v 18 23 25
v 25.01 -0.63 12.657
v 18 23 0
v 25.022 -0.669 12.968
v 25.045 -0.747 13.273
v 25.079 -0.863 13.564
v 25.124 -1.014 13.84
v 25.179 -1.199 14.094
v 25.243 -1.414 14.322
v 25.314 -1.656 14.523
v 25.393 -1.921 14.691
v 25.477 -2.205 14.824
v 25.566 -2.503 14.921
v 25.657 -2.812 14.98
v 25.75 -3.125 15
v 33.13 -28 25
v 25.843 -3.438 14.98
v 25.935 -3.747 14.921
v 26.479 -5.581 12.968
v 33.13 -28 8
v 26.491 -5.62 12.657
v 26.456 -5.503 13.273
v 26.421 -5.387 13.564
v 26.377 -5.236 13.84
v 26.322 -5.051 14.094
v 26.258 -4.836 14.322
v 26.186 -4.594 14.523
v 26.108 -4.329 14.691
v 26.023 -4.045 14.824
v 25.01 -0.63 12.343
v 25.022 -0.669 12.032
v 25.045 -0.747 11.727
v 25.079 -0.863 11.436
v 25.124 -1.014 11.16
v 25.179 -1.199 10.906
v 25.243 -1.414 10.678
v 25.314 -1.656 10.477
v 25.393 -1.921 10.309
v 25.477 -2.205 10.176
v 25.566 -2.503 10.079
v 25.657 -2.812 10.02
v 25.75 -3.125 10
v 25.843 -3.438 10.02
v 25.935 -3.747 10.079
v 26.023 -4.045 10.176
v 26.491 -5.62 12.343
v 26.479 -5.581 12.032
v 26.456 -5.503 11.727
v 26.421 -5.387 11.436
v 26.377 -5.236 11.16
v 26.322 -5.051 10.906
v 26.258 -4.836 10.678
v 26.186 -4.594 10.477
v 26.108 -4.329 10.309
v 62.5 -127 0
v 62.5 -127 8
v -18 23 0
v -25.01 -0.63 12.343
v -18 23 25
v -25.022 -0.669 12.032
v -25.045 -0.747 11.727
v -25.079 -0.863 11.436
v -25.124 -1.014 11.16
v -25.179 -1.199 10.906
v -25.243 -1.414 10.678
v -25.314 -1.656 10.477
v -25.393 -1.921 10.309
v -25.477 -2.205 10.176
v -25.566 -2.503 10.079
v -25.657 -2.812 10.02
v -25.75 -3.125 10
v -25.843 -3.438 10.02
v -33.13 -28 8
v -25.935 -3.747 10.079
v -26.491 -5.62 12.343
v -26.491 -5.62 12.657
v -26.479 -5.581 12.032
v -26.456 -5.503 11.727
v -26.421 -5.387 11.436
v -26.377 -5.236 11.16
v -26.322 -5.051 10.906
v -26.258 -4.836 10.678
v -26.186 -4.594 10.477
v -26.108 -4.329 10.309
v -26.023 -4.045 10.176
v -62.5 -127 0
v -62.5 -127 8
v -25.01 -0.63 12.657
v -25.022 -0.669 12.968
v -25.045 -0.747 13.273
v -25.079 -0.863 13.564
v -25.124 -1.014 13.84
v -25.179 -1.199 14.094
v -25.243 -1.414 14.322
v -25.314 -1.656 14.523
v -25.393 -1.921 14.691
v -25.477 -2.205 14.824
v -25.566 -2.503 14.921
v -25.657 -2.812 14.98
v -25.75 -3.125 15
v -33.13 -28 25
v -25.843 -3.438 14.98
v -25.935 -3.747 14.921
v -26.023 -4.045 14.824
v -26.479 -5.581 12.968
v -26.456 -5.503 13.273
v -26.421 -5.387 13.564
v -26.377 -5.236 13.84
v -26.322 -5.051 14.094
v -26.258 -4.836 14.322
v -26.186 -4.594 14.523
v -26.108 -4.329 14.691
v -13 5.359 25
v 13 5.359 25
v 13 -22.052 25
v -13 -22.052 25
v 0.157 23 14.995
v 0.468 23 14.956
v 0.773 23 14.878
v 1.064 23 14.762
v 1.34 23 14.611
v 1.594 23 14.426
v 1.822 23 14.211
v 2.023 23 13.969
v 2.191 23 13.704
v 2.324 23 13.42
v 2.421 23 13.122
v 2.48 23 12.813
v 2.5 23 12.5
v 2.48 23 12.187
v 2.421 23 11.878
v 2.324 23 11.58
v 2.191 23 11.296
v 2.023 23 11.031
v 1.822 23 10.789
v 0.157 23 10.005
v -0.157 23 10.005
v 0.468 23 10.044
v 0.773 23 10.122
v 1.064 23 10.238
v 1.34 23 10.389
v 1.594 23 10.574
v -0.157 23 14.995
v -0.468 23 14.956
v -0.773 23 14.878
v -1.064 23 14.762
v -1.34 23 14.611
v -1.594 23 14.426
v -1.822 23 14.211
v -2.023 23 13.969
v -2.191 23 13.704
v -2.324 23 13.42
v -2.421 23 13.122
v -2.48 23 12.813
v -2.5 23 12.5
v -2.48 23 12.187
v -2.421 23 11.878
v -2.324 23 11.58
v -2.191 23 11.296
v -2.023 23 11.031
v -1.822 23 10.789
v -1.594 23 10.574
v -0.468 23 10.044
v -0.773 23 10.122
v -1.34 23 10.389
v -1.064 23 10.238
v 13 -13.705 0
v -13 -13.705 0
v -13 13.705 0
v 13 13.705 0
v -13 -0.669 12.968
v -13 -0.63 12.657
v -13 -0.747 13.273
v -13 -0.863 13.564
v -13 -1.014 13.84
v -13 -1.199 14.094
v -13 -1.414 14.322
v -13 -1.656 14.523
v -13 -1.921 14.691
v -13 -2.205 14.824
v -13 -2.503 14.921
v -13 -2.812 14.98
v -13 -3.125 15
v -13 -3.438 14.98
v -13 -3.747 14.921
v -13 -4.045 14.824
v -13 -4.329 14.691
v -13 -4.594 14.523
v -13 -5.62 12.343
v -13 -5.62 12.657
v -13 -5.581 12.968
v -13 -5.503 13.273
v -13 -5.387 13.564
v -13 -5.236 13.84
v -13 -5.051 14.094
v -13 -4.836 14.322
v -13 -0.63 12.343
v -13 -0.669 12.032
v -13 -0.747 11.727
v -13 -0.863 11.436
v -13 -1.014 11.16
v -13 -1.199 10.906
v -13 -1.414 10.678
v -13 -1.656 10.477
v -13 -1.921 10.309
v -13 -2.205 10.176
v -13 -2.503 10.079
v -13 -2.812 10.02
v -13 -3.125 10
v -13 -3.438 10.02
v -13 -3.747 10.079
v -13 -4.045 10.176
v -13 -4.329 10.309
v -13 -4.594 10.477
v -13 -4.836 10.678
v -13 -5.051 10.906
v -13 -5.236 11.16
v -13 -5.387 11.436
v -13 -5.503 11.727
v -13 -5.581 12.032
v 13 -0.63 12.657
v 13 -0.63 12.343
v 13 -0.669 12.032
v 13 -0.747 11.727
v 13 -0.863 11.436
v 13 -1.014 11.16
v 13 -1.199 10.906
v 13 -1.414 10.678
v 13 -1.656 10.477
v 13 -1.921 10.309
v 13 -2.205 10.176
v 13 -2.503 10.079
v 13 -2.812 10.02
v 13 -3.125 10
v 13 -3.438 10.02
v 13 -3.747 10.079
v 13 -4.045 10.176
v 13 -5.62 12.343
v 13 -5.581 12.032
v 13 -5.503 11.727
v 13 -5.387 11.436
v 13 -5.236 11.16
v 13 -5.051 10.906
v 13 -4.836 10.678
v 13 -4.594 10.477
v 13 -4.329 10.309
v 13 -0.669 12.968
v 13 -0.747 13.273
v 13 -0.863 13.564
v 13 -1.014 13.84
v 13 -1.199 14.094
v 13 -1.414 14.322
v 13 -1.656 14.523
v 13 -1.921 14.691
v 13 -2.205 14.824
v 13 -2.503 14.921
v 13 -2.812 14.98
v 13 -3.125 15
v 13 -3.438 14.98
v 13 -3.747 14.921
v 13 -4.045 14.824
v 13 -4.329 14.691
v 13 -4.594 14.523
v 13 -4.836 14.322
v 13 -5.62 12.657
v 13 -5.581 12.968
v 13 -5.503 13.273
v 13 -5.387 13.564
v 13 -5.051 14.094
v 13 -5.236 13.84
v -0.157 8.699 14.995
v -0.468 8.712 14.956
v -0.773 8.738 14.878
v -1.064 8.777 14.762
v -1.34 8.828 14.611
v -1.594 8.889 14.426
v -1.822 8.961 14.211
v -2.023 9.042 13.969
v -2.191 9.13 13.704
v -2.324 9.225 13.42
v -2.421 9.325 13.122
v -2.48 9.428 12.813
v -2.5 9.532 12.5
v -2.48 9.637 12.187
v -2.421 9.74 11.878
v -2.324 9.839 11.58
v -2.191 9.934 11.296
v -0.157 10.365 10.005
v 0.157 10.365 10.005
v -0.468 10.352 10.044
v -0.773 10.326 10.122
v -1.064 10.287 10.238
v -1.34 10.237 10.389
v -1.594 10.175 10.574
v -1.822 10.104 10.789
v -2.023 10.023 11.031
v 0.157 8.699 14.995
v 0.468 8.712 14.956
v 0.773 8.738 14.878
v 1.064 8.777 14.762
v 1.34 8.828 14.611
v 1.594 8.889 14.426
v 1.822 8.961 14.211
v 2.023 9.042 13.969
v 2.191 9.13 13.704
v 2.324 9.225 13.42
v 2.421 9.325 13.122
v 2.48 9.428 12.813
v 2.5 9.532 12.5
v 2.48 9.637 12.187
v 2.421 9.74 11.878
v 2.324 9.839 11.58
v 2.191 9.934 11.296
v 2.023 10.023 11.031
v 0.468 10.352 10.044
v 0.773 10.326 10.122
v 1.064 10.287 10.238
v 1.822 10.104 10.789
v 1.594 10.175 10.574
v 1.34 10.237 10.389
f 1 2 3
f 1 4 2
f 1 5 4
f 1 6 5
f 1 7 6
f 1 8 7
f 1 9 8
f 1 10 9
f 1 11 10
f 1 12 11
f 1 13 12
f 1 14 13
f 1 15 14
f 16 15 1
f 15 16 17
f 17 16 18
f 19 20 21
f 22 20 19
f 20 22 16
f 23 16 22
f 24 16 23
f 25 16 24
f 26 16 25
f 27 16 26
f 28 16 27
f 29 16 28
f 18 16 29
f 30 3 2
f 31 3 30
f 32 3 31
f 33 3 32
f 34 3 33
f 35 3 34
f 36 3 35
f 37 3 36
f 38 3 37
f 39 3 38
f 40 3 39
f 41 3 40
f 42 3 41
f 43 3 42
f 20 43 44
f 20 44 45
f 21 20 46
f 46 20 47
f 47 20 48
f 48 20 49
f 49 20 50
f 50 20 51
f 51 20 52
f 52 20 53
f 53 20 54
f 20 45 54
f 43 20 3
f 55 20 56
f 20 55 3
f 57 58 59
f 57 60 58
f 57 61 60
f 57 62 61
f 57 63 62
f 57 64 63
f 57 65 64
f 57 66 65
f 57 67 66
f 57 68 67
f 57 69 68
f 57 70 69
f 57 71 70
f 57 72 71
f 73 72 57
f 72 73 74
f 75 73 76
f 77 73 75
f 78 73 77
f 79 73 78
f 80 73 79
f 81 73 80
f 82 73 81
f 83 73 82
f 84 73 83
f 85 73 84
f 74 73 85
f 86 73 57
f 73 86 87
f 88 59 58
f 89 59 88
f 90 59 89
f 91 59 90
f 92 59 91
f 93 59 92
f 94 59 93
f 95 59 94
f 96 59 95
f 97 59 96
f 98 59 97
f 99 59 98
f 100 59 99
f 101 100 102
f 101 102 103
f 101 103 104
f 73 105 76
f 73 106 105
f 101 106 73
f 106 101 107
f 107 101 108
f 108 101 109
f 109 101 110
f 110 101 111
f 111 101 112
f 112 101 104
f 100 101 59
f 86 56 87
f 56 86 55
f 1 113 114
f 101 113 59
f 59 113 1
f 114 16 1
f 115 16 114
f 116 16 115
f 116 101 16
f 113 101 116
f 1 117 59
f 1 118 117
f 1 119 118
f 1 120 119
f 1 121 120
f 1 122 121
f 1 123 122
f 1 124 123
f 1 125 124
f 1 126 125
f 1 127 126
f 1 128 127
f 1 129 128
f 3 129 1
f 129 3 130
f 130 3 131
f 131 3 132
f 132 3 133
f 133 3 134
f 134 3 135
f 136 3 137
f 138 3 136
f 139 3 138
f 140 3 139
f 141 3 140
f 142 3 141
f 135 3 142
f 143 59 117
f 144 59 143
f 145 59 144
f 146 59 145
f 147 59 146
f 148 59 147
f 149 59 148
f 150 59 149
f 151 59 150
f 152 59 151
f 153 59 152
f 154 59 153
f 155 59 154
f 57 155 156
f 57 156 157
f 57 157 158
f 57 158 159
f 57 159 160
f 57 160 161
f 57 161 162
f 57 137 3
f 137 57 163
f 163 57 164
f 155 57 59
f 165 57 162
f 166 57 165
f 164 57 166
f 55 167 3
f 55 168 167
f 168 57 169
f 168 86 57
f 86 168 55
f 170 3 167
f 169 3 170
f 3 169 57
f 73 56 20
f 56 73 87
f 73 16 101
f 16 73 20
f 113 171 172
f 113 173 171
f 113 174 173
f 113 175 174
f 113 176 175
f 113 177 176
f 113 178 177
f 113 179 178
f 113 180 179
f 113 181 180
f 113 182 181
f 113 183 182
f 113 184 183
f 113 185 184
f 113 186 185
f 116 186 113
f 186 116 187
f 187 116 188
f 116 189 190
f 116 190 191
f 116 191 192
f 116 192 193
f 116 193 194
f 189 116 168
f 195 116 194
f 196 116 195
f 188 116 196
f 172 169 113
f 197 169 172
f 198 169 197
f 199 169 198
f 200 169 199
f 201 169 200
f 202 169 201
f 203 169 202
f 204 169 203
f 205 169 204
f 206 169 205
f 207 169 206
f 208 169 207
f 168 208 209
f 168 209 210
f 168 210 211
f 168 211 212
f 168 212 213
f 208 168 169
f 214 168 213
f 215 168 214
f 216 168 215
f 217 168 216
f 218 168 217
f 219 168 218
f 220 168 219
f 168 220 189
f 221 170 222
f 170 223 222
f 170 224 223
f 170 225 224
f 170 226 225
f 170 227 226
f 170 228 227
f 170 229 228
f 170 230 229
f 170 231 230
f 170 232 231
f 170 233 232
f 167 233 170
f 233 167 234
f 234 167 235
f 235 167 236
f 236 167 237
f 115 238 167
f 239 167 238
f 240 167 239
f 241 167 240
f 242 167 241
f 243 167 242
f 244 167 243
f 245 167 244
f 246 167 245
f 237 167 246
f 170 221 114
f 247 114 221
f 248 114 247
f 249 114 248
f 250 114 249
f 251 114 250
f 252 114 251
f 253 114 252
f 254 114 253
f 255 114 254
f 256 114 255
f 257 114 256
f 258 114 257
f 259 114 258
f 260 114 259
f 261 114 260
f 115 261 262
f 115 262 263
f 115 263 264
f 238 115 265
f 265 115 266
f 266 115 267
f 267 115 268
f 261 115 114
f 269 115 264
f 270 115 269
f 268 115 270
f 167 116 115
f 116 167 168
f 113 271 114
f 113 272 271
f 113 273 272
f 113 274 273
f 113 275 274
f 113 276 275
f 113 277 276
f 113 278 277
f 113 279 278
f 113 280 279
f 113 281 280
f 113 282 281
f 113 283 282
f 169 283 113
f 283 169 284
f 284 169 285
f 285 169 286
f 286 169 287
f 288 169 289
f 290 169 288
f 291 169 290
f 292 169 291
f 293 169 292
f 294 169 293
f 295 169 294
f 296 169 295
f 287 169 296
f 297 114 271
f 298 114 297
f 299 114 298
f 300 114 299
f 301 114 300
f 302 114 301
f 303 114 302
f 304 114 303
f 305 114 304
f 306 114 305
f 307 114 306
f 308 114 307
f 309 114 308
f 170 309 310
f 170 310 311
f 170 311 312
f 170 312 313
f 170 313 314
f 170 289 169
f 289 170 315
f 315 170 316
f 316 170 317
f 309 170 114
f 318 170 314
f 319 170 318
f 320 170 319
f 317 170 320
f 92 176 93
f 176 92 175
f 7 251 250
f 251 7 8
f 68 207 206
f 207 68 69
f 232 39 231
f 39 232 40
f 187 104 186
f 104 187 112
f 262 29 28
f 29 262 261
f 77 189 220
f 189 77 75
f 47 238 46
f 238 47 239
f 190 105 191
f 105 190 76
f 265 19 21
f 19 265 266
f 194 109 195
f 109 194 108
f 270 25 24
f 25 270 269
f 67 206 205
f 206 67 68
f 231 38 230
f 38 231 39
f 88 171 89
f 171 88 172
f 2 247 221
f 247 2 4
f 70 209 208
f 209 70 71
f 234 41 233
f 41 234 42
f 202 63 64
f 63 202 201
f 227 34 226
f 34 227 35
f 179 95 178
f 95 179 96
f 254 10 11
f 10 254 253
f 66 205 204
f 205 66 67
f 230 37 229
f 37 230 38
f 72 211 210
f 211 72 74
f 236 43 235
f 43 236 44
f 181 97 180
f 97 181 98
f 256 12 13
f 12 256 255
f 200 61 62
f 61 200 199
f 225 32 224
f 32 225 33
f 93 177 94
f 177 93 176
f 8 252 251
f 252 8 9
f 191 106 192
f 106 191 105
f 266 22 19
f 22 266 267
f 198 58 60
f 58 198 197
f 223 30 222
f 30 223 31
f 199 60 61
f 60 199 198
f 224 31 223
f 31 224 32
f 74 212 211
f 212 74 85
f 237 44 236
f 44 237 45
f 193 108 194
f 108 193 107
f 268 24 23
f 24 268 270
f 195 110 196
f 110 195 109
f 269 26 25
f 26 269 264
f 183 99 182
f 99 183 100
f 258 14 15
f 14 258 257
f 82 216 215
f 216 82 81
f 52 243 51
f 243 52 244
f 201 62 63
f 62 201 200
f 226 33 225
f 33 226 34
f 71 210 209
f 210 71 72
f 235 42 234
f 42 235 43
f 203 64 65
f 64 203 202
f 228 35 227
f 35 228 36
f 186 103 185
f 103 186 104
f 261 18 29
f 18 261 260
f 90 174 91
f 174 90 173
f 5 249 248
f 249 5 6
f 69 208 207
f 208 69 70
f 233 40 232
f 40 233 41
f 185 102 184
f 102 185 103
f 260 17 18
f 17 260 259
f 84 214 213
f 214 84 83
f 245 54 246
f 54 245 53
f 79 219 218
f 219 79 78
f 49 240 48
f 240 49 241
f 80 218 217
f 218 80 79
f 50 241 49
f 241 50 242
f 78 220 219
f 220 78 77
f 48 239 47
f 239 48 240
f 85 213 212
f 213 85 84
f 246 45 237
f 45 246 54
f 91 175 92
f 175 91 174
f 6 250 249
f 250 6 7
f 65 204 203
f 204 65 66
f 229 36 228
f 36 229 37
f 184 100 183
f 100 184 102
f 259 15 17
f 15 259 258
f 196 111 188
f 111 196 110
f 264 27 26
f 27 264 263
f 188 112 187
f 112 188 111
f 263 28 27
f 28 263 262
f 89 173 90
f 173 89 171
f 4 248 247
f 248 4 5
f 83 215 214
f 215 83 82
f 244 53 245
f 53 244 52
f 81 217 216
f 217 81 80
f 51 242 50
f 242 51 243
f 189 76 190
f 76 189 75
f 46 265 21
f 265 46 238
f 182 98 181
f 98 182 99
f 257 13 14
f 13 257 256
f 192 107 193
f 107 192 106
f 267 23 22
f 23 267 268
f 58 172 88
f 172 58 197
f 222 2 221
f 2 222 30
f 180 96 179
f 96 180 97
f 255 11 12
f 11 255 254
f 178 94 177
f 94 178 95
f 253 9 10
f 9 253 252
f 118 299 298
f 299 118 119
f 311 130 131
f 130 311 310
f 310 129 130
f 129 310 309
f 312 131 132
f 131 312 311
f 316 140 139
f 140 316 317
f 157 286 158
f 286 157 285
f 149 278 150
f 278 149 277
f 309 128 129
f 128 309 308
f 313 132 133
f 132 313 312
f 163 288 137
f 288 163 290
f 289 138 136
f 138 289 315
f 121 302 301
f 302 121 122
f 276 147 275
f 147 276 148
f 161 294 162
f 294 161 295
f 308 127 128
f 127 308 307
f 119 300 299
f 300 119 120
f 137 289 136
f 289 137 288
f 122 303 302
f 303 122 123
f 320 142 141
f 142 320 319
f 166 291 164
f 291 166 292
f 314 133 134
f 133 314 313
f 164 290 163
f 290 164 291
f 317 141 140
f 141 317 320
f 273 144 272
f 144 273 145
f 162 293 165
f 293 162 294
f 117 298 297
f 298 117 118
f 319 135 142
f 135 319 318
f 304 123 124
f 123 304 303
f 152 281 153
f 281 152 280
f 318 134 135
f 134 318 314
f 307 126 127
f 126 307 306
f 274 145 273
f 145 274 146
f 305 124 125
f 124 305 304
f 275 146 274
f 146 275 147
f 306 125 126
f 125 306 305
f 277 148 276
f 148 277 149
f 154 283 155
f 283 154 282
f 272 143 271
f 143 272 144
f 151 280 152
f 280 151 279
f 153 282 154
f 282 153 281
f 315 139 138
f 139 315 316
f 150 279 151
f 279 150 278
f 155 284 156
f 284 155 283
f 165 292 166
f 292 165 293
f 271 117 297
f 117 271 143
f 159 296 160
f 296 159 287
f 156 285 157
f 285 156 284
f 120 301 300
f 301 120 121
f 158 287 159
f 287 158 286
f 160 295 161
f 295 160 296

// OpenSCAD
// file: variables.scad
// Slide imager variables

//Design and code by Simon Harris, BGS
// simhar@bgs.ac.uk | www.SHphoto.co.uk

//the centre height of the optical system
centerheight=97.5;
// the rail size, allowing a slight positive tolerance (25.4mm becomes 26mm)
rail=26;
//rear filter glass diameter and thickness - remove from holder wearing eye protection
filterdia=63;
filterthick=3;
//diffuser plate dimensions
diffuserdia=60;
diffuserthick=3;
//pivot arm length for filter
pivot=50;
//front filter dimensions - leave in holder
camerafilterdia=57;
camerafilterthread=55;
camerafiltermass=28;
//counterweights
counterweightlength=38.5;
counterweightwidth=13.5;
counterweightmass=12.75 * 3;
//servo dimensions, allowing a slight positive tolerance (0.5mm?) and relative positions of pivot point with wire at bottom, as well as max dimension across ears
servox=12;
servoy=23;
servoxpivot=6;
servoypivot=8;
servoears=32;
// main file
//This part supports the imaging rail at an angle a few degrees above horizontal 

//Design and code by Simon Harris, BGS
// simhar@bgs.ac.uk | www.SHphoto.co.uk

//include global variables
include<variables.scad>;
//overall height of the extruded part
extrude=25;
//thickness of the main support web
webthick=8;
//width at the base
bw=125;
//height - angles will be calculated automatically
h=150;
//length of rail downstream from the prop
lrail=360;
//top width of prop
tw=rail+10;

//calculate rail tilt
tilt=asin((h-(rail*1.0)-10)/lrail);
difference(){
//trapezoid stand
translate([-bw/2,-(h-(rail/2)-10),0])
linear_extrude(height = extrude)
polygon(points=[[(bw/2)-(tw/2),h],[(bw/2)+(tw/2),h],[bw,0],[0,0]]);
//remove thickness
translate([-(bw+10)/2,-h-15-(rail/2)-10,webthick])
cube([bw+10,h+10,extrude]);
//rail
rotate([tilt,0,0])
translate([-(rail)/2,-(rail)/2,-10])
cube([rail,rail,extrude+20]);
//screws to hold to rail - tap M6
translate([0,-extrude/8,extrude/2])
rotate([0,90,0])
cylinder(h=150, r1=2.5, r2=2.5, $fn=50, center=true);
translate([0,-extrude/8,extrude/2])
rotate([-90,0,0])
cylinder(h=150, r1=2.5, r2=2.5, $fn=50, center=false);   
 
}



//fake rail for checking - comment out before export
//rotate([tilt,0,0])
//translate([-(rail)/2,-(rail)/2,0])
//cube([rail,rail,lrail]);
